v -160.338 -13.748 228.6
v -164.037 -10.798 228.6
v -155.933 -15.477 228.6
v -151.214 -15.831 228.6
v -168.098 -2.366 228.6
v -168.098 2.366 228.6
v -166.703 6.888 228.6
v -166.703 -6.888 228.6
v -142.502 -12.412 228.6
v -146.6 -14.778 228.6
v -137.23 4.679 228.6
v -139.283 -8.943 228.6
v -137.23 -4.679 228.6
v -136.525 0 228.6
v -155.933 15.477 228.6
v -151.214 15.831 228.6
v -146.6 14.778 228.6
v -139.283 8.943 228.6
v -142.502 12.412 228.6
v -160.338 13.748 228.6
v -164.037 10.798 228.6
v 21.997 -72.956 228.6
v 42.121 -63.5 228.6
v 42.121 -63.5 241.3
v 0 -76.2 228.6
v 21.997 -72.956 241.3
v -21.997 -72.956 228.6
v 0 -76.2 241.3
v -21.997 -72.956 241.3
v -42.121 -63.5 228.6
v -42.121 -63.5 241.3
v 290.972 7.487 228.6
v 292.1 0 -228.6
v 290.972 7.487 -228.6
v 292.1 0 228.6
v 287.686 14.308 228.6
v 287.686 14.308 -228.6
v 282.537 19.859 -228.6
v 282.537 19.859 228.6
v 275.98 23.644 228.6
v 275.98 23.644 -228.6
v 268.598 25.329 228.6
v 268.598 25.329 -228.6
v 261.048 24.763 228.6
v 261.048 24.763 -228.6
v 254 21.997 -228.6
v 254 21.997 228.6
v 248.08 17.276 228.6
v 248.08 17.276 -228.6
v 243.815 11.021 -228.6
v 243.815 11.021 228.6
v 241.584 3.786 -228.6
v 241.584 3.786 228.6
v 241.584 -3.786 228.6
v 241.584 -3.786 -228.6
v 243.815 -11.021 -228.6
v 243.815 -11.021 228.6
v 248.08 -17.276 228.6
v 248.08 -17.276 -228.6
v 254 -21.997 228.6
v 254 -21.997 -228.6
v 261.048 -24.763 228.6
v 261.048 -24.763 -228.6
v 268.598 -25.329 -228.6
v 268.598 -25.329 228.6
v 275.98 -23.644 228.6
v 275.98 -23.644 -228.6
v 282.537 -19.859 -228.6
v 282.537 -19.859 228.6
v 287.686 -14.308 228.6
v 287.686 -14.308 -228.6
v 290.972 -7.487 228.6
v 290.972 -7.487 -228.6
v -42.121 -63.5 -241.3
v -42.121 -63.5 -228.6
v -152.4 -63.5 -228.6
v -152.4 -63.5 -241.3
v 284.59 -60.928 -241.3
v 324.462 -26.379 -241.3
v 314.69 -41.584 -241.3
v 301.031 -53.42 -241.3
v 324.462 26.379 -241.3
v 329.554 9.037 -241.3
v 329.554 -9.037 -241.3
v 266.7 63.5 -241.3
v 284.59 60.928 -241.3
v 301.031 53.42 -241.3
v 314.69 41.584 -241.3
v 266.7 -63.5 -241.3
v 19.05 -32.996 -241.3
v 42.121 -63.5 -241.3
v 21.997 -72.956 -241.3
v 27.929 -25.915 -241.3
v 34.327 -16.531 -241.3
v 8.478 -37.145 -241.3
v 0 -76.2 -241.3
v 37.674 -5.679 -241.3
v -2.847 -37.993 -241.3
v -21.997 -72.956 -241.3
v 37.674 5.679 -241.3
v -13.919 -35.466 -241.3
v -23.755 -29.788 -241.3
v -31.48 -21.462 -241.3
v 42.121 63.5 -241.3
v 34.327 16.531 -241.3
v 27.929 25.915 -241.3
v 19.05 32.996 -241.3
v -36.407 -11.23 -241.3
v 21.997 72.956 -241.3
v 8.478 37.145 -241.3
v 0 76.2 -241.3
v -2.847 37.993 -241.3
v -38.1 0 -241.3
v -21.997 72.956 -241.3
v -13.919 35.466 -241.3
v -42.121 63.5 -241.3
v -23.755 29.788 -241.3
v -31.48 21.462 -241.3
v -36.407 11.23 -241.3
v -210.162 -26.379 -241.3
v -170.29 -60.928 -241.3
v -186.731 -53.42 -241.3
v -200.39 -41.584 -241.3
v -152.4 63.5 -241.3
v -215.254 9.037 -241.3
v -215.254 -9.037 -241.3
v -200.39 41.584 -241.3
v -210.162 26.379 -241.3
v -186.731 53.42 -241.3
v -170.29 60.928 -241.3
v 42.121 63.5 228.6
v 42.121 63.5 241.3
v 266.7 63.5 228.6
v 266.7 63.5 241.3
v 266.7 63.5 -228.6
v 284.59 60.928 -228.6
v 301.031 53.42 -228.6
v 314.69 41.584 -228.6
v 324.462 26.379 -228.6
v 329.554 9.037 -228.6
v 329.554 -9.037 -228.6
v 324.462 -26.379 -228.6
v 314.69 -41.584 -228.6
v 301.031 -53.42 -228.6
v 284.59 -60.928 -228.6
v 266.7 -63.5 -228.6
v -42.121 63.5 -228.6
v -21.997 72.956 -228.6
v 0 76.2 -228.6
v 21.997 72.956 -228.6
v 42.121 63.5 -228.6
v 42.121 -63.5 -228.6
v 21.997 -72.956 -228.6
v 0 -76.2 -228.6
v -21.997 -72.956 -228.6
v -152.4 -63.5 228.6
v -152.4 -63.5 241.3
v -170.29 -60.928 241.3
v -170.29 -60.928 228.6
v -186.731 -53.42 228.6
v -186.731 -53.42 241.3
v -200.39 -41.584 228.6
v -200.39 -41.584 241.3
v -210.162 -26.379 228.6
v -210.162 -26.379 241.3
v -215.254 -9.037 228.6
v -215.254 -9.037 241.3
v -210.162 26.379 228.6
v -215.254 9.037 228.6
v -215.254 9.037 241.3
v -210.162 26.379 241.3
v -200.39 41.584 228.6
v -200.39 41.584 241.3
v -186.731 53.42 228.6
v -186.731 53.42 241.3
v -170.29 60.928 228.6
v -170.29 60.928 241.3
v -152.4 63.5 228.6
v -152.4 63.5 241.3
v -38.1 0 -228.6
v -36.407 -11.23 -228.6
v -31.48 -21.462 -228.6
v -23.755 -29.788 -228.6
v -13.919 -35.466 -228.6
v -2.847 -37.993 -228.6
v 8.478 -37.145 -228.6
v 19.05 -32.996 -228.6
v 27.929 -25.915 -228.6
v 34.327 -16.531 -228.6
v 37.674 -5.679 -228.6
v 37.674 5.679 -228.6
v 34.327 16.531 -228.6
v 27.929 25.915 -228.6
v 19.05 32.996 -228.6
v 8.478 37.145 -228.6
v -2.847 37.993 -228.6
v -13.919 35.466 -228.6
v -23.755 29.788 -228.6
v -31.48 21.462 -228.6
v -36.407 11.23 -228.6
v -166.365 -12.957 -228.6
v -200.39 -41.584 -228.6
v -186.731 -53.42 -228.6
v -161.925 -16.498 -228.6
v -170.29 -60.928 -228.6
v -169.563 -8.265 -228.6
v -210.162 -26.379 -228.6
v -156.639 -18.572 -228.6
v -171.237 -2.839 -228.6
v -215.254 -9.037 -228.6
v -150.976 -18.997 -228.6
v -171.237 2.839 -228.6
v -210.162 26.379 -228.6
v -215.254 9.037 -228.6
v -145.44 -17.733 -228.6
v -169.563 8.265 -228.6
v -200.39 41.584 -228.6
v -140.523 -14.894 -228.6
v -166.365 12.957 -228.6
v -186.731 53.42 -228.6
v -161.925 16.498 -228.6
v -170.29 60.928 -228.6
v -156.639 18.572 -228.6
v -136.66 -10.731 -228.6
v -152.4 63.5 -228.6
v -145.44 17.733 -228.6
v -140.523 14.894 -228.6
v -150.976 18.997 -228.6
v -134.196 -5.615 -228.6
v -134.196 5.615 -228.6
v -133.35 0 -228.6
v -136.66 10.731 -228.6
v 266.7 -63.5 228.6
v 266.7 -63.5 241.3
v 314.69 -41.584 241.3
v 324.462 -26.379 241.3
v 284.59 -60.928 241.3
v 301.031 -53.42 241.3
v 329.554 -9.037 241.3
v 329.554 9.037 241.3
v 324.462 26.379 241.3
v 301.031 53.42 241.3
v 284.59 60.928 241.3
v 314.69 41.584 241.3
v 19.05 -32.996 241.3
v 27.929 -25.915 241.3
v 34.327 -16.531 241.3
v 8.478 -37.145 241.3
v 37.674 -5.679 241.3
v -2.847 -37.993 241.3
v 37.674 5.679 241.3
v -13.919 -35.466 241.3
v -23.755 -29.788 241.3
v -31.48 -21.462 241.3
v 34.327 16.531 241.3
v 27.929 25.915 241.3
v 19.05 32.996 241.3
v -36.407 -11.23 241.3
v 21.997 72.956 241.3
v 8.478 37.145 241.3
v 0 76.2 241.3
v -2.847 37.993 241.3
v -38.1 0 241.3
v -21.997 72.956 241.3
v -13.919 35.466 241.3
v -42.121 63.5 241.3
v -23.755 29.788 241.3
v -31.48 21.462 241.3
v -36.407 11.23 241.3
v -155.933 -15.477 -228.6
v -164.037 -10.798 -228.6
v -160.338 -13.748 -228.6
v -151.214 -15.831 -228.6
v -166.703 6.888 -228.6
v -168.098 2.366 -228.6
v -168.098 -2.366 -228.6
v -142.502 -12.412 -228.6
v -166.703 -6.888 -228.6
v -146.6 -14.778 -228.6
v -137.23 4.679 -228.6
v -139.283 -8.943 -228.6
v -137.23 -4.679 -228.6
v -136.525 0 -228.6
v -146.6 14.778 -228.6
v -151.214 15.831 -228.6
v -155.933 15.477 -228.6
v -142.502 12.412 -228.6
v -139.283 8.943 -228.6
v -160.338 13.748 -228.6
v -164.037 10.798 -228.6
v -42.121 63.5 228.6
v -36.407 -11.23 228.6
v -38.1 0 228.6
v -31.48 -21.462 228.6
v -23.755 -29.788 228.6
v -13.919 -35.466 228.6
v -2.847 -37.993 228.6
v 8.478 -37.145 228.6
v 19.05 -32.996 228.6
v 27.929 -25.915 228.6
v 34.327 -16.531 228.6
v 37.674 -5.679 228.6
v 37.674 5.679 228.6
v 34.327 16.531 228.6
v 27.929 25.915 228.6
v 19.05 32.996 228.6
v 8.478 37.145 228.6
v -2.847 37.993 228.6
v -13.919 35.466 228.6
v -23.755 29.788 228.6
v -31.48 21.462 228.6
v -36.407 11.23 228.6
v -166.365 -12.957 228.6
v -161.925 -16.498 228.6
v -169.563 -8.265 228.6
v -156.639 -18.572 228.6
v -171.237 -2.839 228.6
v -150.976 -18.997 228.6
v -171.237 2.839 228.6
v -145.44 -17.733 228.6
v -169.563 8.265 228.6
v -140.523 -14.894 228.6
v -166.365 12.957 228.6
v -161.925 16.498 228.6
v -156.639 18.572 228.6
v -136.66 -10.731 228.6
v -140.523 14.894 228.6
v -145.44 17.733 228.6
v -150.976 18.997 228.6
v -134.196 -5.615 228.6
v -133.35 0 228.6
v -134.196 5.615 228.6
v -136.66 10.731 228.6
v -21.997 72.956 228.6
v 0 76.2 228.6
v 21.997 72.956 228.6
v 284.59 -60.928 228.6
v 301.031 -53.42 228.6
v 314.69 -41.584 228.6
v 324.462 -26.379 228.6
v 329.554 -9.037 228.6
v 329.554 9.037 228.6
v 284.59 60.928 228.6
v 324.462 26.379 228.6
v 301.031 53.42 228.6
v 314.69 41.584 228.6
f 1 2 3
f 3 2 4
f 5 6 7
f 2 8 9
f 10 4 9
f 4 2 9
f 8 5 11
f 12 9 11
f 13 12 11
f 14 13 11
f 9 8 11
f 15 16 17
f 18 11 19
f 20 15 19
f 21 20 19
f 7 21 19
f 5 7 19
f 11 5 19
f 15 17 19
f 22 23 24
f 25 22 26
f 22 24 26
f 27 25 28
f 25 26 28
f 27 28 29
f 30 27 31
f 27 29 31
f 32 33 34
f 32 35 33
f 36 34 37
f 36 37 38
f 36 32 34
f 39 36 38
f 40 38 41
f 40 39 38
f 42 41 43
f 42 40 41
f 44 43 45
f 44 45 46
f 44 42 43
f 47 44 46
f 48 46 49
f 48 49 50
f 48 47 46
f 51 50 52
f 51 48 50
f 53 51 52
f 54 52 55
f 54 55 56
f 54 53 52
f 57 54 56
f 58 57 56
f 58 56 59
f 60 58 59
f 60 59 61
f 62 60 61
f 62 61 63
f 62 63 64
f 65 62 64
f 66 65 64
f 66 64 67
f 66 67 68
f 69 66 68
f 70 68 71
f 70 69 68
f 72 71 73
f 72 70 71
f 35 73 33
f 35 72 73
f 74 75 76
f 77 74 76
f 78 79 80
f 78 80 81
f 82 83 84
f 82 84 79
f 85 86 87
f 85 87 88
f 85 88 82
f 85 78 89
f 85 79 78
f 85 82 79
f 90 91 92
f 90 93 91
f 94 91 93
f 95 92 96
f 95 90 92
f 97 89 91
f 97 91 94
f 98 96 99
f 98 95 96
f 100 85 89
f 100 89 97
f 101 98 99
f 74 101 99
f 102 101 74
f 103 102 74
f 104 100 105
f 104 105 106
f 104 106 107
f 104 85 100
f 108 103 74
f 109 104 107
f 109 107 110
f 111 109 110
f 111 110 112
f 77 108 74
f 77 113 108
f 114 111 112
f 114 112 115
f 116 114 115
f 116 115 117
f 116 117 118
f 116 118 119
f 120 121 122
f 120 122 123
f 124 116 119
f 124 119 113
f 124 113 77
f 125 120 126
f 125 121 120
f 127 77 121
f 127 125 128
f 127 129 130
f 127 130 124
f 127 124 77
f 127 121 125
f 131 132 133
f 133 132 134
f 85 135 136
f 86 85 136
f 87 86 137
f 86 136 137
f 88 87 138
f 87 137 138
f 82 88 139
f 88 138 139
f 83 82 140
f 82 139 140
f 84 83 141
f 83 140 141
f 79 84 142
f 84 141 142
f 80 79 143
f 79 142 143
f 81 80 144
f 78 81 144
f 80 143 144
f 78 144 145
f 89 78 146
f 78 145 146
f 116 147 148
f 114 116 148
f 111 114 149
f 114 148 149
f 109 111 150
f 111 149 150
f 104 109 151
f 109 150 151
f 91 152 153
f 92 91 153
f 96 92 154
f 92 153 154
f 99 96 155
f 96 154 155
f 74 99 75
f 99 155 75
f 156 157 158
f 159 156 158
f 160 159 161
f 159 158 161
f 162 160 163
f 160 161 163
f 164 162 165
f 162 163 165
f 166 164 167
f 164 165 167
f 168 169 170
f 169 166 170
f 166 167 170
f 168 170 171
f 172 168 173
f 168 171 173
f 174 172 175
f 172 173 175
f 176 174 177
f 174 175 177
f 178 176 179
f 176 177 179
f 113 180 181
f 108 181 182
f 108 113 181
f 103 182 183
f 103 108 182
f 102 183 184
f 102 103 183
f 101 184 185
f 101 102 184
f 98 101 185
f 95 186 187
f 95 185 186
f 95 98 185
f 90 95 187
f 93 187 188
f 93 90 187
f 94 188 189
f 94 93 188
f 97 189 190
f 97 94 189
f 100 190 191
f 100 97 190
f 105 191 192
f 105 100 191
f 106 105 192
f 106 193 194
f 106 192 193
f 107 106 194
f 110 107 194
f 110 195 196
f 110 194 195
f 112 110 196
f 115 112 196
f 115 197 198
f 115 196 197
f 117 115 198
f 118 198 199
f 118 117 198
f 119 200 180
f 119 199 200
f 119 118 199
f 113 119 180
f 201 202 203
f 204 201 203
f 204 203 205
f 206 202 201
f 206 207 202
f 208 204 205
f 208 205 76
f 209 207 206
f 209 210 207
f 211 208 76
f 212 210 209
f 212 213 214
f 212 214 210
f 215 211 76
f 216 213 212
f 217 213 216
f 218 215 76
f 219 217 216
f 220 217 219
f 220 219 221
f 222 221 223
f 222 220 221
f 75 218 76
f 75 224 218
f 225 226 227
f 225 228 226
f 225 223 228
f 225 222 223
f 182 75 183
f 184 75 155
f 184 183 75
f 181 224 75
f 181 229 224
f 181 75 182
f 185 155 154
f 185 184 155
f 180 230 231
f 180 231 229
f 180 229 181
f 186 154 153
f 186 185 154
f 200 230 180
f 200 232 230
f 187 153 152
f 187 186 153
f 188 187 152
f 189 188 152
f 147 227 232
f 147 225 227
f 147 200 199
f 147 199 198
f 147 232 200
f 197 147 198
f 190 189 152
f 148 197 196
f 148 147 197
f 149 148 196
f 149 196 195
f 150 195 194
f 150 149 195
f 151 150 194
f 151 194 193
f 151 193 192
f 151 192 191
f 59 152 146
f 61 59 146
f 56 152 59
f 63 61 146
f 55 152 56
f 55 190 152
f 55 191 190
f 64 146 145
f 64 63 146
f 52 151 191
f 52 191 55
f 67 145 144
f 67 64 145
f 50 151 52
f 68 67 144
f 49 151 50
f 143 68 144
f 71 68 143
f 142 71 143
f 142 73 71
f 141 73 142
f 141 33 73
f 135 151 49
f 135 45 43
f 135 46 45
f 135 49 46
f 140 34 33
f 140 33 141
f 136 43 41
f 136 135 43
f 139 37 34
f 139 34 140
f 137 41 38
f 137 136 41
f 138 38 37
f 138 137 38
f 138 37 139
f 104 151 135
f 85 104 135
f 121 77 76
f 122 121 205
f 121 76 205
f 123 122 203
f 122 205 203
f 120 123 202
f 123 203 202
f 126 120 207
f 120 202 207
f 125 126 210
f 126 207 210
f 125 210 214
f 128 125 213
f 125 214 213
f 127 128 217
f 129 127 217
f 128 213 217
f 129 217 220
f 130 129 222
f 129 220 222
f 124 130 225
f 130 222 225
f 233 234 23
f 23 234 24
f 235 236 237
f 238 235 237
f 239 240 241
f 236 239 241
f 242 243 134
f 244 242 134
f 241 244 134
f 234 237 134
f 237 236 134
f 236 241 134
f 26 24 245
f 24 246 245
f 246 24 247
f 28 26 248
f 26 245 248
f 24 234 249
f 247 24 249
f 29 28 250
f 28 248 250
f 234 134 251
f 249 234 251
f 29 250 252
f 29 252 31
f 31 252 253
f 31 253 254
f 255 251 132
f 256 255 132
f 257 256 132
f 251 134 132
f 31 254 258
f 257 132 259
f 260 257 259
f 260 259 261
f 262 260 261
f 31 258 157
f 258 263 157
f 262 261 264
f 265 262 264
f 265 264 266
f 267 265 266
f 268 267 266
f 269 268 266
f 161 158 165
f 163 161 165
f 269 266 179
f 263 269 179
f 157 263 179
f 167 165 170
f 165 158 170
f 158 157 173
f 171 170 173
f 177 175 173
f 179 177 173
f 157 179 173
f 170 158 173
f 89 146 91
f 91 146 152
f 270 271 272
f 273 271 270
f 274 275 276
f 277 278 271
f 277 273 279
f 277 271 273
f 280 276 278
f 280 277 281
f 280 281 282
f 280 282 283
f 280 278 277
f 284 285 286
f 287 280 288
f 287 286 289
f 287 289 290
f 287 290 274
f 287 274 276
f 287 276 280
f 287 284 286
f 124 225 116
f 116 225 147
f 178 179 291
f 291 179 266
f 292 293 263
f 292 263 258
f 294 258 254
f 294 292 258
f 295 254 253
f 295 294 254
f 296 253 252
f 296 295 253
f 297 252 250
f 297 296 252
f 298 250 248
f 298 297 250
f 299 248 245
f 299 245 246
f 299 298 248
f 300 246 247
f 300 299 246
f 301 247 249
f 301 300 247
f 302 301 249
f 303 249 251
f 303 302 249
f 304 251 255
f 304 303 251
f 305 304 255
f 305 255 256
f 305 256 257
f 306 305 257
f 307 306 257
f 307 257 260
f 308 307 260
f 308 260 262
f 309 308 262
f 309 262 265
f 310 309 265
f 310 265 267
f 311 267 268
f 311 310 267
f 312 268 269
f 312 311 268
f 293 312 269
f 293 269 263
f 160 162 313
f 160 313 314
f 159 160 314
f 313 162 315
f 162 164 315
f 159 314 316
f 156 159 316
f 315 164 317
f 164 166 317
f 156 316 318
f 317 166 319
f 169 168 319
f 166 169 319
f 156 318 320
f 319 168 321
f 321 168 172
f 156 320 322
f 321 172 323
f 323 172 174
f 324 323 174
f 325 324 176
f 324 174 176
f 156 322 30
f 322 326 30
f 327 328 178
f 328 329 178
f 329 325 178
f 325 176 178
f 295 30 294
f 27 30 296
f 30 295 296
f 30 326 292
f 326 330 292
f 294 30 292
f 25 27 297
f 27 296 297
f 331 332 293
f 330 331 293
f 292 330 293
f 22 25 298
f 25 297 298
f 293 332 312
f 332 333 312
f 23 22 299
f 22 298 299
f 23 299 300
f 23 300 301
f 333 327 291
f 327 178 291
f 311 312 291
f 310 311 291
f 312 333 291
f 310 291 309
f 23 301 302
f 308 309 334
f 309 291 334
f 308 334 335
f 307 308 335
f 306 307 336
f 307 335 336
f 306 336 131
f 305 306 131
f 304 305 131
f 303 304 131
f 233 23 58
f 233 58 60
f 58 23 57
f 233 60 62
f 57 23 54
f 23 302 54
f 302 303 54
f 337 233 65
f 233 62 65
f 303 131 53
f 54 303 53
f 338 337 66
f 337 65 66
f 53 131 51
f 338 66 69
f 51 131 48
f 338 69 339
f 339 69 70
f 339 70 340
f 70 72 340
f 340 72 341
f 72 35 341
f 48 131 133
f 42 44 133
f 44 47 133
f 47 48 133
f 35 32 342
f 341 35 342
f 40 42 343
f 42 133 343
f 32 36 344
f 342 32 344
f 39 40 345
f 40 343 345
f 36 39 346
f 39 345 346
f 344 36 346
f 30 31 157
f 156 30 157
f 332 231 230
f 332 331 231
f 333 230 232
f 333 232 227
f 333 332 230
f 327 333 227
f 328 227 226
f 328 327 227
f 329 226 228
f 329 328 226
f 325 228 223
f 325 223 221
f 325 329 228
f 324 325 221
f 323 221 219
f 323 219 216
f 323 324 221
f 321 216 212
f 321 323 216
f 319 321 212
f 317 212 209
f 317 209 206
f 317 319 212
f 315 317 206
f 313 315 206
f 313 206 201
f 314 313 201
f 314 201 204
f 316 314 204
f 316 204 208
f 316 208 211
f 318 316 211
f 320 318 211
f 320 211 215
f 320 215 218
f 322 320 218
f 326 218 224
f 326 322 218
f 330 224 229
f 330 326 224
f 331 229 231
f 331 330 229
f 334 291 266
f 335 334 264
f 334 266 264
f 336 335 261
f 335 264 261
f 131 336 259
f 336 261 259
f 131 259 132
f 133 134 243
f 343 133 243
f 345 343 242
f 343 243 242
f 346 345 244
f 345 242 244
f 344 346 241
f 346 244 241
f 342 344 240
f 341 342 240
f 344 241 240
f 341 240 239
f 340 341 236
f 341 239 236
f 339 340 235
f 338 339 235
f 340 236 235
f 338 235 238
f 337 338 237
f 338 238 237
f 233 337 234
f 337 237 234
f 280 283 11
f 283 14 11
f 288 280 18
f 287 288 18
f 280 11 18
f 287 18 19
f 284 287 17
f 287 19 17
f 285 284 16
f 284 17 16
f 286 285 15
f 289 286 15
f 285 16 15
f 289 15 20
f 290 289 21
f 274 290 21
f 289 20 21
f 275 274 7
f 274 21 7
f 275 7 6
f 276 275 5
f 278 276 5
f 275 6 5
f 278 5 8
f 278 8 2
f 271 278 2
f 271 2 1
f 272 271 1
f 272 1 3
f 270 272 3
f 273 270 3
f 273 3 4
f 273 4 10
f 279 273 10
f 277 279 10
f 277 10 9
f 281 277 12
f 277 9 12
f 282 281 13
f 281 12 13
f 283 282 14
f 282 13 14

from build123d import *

# Parameters (mm, degrees)
SKETCH1_R           = 38.1
BOSS_EXTRUDE1_DEPTH = 241.3
SKETCH3_R           = 330.2
SKETCH3_R_2         = 19.05
SKETCH3_R_3         = 25.4
SKETCH3_R_4         = 15.875
CUT_EXTRUDE1_DEPTH  = 228.6


with BuildPart() as part:
    # Sketch1 → Boss-Extrude1 (new, symmetric)
    with BuildSketch(Plane.XY):
        with BuildLine():
            Line((-152.4, 63.5), (-42.121134838, 63.5))
            ThreePointArc((-42.121134838, 63.5), (0, 76.2), (42.121134838, 63.5))
            Line((42.121134838, 63.5), (266.7, 63.5))
            ThreePointArc((266.7, 63.5), (330.2, 0), (266.7, -63.5))
            Line((266.7, -63.5), (42.121134838, -63.5))
            ThreePointArc((42.121134838, -63.5), (0, -76.2), (-42.121134838, -63.5))
            Line((-42.121134838, -63.5), (-152.4, -63.5))
            ThreePointArc((-152.4, -63.5), (-215.9, 0), (-152.4, 63.5))
        make_face()
        Circle(SKETCH1_R, mode=Mode.SUBTRACT)
    extrude(amount=BOSS_EXTRUDE1_DEPTH, both=True)

    # Sketch3 → Cut-Extrude1 (cut, symmetric)
    # profile 1 of 2: a face of its own
    with BuildSketch(Plane.XY):
        Circle(SKETCH3_R)
        with Locations((-152.4, 0)):
            Circle(SKETCH3_R_2, mode=Mode.SUBTRACT)
        with Locations((266.7, 0)):
            Circle(SKETCH3_R_3, mode=Mode.SUBTRACT)
    # profile 2 of 2: a face of its own
    with BuildSketch(Plane.XY):
        with Locations((-152.4, 0)):
            Circle(SKETCH3_R_4)
    extrude(amount=CUT_EXTRUDE1_DEPTH, both=True, mode=Mode.SUBTRACT)


solid = part.part
